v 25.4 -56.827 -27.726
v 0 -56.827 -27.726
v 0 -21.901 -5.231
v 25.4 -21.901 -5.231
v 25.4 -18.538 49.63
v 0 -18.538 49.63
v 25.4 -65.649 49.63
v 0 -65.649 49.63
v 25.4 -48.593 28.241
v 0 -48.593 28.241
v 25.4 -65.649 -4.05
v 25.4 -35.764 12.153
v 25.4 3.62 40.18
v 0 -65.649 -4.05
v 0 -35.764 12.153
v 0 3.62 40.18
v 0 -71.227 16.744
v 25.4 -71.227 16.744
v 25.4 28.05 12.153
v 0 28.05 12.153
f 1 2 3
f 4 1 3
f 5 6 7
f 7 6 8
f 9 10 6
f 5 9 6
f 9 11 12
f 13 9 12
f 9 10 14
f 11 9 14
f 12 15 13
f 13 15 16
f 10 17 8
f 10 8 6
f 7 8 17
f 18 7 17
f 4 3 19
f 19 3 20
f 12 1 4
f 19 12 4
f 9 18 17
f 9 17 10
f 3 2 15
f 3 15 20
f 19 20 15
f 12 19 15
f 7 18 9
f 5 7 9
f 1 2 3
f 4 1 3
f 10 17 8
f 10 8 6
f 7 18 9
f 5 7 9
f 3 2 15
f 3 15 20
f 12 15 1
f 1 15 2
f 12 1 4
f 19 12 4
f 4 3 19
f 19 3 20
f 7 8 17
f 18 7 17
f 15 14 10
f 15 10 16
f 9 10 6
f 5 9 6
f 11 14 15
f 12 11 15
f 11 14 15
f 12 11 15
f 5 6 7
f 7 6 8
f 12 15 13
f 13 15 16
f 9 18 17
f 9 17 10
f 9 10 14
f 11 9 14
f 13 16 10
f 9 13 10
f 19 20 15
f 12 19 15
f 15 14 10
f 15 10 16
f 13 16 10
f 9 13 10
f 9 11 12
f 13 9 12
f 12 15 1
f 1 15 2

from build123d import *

# Parameters (mm, degrees)
F1_DEPTH = 25.4
F2_DEPTH = 25.4


with BuildPart() as f1:
    # F0 (on Right) → F1 (new body)
    with BuildSketch(Plane.YZ):
        Polygon((-18.537786, 49.629994), (-65.649323, 49.629994), (-48.59299, 28.24089), align=None)
        Polygon((28.049728, 12.152521), (-35.763626, 12.152521), (-21.901455, -5.231017), align=None)
        Polygon((-21.901455, -5.231017), (-35.763626, 12.152521), (-56.827477, -27.725672), align=None)
        Polygon((3.619639, 40.180039), (-48.59299, 28.24089), (-35.763626, 12.152521), align=None)
        Polygon((-35.763626, 12.152521), (-48.59299, 28.24089), (-65.649323, -4.050251), align=None)
        Polygon((-48.59299, 28.24089), (-65.649323, 49.629994), (-71.226753, 16.744107), align=None)
    extrude(amount=F1_DEPTH)


with BuildPart() as f2:
    # F0 (on Right) → F2 (new body)
    with BuildSketch(Plane.YZ):
        Polygon((-18.537786, 49.629994), (-65.649323, 49.629994), (-48.59299, 28.24089), align=None)
        Polygon((28.049728, 12.152521), (-35.763626, 12.152521), (-21.901455, -5.231017), align=None)
        Polygon((-21.901455, -5.231017), (-35.763626, 12.152521), (-56.827477, -27.725672), align=None)
        Polygon((3.619639, 40.180039), (-48.59299, 28.24089), (-35.763626, 12.152521), align=None)
        Polygon((-35.763626, 12.152521), (-48.59299, 28.24089), (-65.649323, -4.050251), align=None)
        Polygon((-48.59299, 28.24089), (-65.649323, 49.629994), (-71.226753, 16.744107), align=None)
    extrude(amount=F2_DEPTH)


solid = Compound([f1.part, f2.part])
